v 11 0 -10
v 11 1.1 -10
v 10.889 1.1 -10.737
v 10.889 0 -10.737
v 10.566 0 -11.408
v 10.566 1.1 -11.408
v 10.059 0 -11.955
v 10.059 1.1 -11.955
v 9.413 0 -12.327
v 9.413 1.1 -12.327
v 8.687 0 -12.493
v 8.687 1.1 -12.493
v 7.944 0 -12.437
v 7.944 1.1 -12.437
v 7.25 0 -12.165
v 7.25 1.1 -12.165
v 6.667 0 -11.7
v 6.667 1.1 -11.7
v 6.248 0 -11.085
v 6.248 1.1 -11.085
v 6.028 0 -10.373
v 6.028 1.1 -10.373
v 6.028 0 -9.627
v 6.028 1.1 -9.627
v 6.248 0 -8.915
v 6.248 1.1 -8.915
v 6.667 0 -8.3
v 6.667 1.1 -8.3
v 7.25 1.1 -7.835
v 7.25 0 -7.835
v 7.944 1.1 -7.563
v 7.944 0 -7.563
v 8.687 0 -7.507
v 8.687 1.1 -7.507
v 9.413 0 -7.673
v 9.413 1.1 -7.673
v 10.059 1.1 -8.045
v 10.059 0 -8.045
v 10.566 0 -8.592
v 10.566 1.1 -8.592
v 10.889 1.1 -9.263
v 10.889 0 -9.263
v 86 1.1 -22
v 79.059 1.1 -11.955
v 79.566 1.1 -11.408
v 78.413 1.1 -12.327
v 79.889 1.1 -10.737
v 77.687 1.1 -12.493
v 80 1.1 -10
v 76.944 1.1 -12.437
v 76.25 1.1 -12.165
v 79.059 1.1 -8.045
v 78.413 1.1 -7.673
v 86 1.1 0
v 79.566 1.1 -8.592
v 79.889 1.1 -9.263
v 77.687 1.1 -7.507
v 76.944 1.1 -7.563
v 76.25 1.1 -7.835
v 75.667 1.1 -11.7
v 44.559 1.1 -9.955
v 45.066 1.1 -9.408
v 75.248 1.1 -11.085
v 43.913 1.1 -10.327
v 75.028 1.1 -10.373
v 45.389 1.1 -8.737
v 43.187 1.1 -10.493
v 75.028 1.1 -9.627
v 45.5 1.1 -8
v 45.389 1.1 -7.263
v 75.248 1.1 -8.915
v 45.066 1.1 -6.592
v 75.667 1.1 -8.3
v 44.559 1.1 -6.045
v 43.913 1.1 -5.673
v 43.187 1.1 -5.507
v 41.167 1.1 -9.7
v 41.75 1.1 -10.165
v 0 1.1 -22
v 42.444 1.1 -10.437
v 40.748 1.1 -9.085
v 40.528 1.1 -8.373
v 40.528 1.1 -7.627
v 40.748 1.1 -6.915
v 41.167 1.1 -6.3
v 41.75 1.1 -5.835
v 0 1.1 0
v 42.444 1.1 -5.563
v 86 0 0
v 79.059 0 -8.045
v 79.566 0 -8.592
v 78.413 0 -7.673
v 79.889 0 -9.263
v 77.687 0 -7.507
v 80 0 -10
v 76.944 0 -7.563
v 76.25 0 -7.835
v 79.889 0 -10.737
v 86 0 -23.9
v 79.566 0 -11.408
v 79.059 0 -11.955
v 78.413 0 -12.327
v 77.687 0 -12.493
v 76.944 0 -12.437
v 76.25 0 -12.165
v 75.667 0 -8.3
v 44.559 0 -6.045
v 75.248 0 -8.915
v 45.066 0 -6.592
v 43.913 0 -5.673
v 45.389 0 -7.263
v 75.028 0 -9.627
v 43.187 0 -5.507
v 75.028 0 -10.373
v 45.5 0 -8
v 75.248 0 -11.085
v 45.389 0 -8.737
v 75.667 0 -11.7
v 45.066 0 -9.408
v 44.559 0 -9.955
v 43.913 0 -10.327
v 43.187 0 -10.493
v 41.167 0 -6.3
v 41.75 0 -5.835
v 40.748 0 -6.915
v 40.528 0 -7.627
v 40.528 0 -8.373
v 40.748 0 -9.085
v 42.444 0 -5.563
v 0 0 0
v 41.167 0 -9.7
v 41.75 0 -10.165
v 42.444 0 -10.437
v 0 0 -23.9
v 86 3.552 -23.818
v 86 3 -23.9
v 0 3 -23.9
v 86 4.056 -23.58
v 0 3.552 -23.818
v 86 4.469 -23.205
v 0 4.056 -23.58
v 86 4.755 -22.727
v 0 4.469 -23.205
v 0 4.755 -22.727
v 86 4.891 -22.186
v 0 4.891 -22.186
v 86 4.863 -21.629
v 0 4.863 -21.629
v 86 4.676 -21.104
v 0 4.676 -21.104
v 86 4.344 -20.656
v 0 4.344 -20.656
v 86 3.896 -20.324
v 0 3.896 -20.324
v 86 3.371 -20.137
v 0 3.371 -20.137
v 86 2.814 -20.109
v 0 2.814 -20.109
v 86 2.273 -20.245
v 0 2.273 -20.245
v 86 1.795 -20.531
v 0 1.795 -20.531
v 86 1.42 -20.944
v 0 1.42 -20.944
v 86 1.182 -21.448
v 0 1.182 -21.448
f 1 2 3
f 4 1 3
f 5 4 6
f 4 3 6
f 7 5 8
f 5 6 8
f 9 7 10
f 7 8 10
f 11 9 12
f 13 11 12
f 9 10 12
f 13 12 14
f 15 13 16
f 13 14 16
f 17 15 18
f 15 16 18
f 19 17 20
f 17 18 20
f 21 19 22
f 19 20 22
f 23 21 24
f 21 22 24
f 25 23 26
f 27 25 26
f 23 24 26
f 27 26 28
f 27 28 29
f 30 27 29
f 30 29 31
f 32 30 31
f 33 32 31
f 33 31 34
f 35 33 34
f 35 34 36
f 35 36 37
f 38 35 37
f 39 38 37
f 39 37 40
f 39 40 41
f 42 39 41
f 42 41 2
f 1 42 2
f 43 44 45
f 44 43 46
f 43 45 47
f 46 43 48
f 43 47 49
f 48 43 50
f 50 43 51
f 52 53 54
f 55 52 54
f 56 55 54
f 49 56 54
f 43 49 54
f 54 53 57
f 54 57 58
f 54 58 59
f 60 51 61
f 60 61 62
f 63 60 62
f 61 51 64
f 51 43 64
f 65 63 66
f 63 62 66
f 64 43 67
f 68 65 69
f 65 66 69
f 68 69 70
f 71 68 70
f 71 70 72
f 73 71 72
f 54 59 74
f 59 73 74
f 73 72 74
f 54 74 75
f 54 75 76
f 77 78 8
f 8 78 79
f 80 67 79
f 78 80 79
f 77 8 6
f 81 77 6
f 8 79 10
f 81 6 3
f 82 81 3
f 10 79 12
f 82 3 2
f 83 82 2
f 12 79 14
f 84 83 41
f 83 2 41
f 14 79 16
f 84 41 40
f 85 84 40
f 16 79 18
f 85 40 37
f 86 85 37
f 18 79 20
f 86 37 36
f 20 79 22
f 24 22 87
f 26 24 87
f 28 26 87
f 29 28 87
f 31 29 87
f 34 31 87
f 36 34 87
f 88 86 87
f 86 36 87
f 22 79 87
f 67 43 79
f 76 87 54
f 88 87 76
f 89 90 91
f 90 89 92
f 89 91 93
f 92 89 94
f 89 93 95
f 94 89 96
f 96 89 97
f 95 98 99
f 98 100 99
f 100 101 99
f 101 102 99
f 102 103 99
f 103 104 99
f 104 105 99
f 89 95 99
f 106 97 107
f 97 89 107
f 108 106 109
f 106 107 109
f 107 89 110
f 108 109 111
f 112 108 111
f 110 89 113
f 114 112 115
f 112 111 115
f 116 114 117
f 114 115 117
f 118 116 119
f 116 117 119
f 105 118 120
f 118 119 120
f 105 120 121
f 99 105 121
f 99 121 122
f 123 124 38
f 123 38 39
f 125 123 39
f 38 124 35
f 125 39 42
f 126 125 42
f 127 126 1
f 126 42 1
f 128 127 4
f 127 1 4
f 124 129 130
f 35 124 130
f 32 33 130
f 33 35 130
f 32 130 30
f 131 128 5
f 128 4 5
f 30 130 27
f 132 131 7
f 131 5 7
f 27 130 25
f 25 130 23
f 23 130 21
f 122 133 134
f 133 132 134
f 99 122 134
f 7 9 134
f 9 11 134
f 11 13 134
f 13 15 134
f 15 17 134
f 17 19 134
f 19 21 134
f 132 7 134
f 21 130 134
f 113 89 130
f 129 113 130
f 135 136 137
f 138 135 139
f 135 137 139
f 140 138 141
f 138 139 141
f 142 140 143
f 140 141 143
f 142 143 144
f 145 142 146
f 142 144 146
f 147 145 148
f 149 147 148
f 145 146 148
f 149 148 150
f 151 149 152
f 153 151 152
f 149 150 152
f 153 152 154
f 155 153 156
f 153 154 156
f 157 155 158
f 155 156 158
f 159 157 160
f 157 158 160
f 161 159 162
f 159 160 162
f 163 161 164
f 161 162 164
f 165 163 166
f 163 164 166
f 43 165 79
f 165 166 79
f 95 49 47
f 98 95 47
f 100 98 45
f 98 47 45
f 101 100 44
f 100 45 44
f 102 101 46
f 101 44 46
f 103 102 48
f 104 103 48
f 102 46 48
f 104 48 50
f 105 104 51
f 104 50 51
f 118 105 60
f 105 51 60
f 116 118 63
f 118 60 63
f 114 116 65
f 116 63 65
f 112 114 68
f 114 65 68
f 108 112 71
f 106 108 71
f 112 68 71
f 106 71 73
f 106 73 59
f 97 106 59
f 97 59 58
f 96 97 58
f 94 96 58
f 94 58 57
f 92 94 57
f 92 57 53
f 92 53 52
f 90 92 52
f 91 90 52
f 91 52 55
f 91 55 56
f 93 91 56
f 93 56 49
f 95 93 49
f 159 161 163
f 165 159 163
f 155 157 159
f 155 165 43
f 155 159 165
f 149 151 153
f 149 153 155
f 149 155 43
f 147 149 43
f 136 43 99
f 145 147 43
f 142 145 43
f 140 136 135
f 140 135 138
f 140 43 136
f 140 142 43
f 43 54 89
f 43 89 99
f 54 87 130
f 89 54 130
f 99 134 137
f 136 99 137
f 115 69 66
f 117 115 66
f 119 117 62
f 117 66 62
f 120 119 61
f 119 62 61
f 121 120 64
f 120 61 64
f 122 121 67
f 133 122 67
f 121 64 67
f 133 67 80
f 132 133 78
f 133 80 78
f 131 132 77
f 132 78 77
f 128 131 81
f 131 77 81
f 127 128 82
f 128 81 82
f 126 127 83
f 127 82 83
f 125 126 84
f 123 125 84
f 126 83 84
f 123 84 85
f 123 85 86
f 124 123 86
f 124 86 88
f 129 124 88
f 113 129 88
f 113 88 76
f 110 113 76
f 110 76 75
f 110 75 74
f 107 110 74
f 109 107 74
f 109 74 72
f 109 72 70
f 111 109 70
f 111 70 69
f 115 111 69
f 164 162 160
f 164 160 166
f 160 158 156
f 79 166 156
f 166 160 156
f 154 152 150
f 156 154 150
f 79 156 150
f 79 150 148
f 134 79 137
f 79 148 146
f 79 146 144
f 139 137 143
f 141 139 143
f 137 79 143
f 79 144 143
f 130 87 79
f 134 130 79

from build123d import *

# Parameters (mm, degrees)
SKETCH_1_R          = 1.9
EXTRUDE_1_DEPTH     = 86
SKETCH_2_R          = 2.5
CUT_EXTRUDE_1_DEPTH = 2.1


with BuildPart() as part:
    # 草图1 → 凸台-拉伸1 (new body)
    with BuildSketch(Plane(origin=(0, 0, 0), x_dir=(0, 0, -1), z_dir=(1, 0, 0))):
        with Locations((22, 3)):
            Circle(SKETCH_1_R)
        with BuildLine():
            Line((0, 1.1), (0, 0))
            Line((0, 0), (19, 0))
            Line((19, 0), (23.9, 0))
            Line((23.9, 0), (23.9, 3))
            ThreePointArc((23.9, 3), (23.343502884, 1.656497116), (22, 1.1))
            Line((22, 1.1), (19, 1.1))
            Line((19, 1.1), (0, 1.1))
        make_face()
    extrude(amount=EXTRUDE_1_DEPTH)

    # 草图2 → 切除-拉伸1 (cut, through all)
    with BuildSketch(Plane(origin=(0, 1.1, 0), x_dir=(1, 0, 0), z_dir=(0, 1, 0))):
        with Locations((8.5, 10)):
            Circle(SKETCH_2_R)
        with Locations((77.5, 10)):
            Circle(SKETCH_2_R)
        with Locations((43, 8)):
            Circle(SKETCH_2_R)
    extrude(amount=-CUT_EXTRUDE_1_DEPTH, mode=Mode.SUBTRACT)


solid = part.part
